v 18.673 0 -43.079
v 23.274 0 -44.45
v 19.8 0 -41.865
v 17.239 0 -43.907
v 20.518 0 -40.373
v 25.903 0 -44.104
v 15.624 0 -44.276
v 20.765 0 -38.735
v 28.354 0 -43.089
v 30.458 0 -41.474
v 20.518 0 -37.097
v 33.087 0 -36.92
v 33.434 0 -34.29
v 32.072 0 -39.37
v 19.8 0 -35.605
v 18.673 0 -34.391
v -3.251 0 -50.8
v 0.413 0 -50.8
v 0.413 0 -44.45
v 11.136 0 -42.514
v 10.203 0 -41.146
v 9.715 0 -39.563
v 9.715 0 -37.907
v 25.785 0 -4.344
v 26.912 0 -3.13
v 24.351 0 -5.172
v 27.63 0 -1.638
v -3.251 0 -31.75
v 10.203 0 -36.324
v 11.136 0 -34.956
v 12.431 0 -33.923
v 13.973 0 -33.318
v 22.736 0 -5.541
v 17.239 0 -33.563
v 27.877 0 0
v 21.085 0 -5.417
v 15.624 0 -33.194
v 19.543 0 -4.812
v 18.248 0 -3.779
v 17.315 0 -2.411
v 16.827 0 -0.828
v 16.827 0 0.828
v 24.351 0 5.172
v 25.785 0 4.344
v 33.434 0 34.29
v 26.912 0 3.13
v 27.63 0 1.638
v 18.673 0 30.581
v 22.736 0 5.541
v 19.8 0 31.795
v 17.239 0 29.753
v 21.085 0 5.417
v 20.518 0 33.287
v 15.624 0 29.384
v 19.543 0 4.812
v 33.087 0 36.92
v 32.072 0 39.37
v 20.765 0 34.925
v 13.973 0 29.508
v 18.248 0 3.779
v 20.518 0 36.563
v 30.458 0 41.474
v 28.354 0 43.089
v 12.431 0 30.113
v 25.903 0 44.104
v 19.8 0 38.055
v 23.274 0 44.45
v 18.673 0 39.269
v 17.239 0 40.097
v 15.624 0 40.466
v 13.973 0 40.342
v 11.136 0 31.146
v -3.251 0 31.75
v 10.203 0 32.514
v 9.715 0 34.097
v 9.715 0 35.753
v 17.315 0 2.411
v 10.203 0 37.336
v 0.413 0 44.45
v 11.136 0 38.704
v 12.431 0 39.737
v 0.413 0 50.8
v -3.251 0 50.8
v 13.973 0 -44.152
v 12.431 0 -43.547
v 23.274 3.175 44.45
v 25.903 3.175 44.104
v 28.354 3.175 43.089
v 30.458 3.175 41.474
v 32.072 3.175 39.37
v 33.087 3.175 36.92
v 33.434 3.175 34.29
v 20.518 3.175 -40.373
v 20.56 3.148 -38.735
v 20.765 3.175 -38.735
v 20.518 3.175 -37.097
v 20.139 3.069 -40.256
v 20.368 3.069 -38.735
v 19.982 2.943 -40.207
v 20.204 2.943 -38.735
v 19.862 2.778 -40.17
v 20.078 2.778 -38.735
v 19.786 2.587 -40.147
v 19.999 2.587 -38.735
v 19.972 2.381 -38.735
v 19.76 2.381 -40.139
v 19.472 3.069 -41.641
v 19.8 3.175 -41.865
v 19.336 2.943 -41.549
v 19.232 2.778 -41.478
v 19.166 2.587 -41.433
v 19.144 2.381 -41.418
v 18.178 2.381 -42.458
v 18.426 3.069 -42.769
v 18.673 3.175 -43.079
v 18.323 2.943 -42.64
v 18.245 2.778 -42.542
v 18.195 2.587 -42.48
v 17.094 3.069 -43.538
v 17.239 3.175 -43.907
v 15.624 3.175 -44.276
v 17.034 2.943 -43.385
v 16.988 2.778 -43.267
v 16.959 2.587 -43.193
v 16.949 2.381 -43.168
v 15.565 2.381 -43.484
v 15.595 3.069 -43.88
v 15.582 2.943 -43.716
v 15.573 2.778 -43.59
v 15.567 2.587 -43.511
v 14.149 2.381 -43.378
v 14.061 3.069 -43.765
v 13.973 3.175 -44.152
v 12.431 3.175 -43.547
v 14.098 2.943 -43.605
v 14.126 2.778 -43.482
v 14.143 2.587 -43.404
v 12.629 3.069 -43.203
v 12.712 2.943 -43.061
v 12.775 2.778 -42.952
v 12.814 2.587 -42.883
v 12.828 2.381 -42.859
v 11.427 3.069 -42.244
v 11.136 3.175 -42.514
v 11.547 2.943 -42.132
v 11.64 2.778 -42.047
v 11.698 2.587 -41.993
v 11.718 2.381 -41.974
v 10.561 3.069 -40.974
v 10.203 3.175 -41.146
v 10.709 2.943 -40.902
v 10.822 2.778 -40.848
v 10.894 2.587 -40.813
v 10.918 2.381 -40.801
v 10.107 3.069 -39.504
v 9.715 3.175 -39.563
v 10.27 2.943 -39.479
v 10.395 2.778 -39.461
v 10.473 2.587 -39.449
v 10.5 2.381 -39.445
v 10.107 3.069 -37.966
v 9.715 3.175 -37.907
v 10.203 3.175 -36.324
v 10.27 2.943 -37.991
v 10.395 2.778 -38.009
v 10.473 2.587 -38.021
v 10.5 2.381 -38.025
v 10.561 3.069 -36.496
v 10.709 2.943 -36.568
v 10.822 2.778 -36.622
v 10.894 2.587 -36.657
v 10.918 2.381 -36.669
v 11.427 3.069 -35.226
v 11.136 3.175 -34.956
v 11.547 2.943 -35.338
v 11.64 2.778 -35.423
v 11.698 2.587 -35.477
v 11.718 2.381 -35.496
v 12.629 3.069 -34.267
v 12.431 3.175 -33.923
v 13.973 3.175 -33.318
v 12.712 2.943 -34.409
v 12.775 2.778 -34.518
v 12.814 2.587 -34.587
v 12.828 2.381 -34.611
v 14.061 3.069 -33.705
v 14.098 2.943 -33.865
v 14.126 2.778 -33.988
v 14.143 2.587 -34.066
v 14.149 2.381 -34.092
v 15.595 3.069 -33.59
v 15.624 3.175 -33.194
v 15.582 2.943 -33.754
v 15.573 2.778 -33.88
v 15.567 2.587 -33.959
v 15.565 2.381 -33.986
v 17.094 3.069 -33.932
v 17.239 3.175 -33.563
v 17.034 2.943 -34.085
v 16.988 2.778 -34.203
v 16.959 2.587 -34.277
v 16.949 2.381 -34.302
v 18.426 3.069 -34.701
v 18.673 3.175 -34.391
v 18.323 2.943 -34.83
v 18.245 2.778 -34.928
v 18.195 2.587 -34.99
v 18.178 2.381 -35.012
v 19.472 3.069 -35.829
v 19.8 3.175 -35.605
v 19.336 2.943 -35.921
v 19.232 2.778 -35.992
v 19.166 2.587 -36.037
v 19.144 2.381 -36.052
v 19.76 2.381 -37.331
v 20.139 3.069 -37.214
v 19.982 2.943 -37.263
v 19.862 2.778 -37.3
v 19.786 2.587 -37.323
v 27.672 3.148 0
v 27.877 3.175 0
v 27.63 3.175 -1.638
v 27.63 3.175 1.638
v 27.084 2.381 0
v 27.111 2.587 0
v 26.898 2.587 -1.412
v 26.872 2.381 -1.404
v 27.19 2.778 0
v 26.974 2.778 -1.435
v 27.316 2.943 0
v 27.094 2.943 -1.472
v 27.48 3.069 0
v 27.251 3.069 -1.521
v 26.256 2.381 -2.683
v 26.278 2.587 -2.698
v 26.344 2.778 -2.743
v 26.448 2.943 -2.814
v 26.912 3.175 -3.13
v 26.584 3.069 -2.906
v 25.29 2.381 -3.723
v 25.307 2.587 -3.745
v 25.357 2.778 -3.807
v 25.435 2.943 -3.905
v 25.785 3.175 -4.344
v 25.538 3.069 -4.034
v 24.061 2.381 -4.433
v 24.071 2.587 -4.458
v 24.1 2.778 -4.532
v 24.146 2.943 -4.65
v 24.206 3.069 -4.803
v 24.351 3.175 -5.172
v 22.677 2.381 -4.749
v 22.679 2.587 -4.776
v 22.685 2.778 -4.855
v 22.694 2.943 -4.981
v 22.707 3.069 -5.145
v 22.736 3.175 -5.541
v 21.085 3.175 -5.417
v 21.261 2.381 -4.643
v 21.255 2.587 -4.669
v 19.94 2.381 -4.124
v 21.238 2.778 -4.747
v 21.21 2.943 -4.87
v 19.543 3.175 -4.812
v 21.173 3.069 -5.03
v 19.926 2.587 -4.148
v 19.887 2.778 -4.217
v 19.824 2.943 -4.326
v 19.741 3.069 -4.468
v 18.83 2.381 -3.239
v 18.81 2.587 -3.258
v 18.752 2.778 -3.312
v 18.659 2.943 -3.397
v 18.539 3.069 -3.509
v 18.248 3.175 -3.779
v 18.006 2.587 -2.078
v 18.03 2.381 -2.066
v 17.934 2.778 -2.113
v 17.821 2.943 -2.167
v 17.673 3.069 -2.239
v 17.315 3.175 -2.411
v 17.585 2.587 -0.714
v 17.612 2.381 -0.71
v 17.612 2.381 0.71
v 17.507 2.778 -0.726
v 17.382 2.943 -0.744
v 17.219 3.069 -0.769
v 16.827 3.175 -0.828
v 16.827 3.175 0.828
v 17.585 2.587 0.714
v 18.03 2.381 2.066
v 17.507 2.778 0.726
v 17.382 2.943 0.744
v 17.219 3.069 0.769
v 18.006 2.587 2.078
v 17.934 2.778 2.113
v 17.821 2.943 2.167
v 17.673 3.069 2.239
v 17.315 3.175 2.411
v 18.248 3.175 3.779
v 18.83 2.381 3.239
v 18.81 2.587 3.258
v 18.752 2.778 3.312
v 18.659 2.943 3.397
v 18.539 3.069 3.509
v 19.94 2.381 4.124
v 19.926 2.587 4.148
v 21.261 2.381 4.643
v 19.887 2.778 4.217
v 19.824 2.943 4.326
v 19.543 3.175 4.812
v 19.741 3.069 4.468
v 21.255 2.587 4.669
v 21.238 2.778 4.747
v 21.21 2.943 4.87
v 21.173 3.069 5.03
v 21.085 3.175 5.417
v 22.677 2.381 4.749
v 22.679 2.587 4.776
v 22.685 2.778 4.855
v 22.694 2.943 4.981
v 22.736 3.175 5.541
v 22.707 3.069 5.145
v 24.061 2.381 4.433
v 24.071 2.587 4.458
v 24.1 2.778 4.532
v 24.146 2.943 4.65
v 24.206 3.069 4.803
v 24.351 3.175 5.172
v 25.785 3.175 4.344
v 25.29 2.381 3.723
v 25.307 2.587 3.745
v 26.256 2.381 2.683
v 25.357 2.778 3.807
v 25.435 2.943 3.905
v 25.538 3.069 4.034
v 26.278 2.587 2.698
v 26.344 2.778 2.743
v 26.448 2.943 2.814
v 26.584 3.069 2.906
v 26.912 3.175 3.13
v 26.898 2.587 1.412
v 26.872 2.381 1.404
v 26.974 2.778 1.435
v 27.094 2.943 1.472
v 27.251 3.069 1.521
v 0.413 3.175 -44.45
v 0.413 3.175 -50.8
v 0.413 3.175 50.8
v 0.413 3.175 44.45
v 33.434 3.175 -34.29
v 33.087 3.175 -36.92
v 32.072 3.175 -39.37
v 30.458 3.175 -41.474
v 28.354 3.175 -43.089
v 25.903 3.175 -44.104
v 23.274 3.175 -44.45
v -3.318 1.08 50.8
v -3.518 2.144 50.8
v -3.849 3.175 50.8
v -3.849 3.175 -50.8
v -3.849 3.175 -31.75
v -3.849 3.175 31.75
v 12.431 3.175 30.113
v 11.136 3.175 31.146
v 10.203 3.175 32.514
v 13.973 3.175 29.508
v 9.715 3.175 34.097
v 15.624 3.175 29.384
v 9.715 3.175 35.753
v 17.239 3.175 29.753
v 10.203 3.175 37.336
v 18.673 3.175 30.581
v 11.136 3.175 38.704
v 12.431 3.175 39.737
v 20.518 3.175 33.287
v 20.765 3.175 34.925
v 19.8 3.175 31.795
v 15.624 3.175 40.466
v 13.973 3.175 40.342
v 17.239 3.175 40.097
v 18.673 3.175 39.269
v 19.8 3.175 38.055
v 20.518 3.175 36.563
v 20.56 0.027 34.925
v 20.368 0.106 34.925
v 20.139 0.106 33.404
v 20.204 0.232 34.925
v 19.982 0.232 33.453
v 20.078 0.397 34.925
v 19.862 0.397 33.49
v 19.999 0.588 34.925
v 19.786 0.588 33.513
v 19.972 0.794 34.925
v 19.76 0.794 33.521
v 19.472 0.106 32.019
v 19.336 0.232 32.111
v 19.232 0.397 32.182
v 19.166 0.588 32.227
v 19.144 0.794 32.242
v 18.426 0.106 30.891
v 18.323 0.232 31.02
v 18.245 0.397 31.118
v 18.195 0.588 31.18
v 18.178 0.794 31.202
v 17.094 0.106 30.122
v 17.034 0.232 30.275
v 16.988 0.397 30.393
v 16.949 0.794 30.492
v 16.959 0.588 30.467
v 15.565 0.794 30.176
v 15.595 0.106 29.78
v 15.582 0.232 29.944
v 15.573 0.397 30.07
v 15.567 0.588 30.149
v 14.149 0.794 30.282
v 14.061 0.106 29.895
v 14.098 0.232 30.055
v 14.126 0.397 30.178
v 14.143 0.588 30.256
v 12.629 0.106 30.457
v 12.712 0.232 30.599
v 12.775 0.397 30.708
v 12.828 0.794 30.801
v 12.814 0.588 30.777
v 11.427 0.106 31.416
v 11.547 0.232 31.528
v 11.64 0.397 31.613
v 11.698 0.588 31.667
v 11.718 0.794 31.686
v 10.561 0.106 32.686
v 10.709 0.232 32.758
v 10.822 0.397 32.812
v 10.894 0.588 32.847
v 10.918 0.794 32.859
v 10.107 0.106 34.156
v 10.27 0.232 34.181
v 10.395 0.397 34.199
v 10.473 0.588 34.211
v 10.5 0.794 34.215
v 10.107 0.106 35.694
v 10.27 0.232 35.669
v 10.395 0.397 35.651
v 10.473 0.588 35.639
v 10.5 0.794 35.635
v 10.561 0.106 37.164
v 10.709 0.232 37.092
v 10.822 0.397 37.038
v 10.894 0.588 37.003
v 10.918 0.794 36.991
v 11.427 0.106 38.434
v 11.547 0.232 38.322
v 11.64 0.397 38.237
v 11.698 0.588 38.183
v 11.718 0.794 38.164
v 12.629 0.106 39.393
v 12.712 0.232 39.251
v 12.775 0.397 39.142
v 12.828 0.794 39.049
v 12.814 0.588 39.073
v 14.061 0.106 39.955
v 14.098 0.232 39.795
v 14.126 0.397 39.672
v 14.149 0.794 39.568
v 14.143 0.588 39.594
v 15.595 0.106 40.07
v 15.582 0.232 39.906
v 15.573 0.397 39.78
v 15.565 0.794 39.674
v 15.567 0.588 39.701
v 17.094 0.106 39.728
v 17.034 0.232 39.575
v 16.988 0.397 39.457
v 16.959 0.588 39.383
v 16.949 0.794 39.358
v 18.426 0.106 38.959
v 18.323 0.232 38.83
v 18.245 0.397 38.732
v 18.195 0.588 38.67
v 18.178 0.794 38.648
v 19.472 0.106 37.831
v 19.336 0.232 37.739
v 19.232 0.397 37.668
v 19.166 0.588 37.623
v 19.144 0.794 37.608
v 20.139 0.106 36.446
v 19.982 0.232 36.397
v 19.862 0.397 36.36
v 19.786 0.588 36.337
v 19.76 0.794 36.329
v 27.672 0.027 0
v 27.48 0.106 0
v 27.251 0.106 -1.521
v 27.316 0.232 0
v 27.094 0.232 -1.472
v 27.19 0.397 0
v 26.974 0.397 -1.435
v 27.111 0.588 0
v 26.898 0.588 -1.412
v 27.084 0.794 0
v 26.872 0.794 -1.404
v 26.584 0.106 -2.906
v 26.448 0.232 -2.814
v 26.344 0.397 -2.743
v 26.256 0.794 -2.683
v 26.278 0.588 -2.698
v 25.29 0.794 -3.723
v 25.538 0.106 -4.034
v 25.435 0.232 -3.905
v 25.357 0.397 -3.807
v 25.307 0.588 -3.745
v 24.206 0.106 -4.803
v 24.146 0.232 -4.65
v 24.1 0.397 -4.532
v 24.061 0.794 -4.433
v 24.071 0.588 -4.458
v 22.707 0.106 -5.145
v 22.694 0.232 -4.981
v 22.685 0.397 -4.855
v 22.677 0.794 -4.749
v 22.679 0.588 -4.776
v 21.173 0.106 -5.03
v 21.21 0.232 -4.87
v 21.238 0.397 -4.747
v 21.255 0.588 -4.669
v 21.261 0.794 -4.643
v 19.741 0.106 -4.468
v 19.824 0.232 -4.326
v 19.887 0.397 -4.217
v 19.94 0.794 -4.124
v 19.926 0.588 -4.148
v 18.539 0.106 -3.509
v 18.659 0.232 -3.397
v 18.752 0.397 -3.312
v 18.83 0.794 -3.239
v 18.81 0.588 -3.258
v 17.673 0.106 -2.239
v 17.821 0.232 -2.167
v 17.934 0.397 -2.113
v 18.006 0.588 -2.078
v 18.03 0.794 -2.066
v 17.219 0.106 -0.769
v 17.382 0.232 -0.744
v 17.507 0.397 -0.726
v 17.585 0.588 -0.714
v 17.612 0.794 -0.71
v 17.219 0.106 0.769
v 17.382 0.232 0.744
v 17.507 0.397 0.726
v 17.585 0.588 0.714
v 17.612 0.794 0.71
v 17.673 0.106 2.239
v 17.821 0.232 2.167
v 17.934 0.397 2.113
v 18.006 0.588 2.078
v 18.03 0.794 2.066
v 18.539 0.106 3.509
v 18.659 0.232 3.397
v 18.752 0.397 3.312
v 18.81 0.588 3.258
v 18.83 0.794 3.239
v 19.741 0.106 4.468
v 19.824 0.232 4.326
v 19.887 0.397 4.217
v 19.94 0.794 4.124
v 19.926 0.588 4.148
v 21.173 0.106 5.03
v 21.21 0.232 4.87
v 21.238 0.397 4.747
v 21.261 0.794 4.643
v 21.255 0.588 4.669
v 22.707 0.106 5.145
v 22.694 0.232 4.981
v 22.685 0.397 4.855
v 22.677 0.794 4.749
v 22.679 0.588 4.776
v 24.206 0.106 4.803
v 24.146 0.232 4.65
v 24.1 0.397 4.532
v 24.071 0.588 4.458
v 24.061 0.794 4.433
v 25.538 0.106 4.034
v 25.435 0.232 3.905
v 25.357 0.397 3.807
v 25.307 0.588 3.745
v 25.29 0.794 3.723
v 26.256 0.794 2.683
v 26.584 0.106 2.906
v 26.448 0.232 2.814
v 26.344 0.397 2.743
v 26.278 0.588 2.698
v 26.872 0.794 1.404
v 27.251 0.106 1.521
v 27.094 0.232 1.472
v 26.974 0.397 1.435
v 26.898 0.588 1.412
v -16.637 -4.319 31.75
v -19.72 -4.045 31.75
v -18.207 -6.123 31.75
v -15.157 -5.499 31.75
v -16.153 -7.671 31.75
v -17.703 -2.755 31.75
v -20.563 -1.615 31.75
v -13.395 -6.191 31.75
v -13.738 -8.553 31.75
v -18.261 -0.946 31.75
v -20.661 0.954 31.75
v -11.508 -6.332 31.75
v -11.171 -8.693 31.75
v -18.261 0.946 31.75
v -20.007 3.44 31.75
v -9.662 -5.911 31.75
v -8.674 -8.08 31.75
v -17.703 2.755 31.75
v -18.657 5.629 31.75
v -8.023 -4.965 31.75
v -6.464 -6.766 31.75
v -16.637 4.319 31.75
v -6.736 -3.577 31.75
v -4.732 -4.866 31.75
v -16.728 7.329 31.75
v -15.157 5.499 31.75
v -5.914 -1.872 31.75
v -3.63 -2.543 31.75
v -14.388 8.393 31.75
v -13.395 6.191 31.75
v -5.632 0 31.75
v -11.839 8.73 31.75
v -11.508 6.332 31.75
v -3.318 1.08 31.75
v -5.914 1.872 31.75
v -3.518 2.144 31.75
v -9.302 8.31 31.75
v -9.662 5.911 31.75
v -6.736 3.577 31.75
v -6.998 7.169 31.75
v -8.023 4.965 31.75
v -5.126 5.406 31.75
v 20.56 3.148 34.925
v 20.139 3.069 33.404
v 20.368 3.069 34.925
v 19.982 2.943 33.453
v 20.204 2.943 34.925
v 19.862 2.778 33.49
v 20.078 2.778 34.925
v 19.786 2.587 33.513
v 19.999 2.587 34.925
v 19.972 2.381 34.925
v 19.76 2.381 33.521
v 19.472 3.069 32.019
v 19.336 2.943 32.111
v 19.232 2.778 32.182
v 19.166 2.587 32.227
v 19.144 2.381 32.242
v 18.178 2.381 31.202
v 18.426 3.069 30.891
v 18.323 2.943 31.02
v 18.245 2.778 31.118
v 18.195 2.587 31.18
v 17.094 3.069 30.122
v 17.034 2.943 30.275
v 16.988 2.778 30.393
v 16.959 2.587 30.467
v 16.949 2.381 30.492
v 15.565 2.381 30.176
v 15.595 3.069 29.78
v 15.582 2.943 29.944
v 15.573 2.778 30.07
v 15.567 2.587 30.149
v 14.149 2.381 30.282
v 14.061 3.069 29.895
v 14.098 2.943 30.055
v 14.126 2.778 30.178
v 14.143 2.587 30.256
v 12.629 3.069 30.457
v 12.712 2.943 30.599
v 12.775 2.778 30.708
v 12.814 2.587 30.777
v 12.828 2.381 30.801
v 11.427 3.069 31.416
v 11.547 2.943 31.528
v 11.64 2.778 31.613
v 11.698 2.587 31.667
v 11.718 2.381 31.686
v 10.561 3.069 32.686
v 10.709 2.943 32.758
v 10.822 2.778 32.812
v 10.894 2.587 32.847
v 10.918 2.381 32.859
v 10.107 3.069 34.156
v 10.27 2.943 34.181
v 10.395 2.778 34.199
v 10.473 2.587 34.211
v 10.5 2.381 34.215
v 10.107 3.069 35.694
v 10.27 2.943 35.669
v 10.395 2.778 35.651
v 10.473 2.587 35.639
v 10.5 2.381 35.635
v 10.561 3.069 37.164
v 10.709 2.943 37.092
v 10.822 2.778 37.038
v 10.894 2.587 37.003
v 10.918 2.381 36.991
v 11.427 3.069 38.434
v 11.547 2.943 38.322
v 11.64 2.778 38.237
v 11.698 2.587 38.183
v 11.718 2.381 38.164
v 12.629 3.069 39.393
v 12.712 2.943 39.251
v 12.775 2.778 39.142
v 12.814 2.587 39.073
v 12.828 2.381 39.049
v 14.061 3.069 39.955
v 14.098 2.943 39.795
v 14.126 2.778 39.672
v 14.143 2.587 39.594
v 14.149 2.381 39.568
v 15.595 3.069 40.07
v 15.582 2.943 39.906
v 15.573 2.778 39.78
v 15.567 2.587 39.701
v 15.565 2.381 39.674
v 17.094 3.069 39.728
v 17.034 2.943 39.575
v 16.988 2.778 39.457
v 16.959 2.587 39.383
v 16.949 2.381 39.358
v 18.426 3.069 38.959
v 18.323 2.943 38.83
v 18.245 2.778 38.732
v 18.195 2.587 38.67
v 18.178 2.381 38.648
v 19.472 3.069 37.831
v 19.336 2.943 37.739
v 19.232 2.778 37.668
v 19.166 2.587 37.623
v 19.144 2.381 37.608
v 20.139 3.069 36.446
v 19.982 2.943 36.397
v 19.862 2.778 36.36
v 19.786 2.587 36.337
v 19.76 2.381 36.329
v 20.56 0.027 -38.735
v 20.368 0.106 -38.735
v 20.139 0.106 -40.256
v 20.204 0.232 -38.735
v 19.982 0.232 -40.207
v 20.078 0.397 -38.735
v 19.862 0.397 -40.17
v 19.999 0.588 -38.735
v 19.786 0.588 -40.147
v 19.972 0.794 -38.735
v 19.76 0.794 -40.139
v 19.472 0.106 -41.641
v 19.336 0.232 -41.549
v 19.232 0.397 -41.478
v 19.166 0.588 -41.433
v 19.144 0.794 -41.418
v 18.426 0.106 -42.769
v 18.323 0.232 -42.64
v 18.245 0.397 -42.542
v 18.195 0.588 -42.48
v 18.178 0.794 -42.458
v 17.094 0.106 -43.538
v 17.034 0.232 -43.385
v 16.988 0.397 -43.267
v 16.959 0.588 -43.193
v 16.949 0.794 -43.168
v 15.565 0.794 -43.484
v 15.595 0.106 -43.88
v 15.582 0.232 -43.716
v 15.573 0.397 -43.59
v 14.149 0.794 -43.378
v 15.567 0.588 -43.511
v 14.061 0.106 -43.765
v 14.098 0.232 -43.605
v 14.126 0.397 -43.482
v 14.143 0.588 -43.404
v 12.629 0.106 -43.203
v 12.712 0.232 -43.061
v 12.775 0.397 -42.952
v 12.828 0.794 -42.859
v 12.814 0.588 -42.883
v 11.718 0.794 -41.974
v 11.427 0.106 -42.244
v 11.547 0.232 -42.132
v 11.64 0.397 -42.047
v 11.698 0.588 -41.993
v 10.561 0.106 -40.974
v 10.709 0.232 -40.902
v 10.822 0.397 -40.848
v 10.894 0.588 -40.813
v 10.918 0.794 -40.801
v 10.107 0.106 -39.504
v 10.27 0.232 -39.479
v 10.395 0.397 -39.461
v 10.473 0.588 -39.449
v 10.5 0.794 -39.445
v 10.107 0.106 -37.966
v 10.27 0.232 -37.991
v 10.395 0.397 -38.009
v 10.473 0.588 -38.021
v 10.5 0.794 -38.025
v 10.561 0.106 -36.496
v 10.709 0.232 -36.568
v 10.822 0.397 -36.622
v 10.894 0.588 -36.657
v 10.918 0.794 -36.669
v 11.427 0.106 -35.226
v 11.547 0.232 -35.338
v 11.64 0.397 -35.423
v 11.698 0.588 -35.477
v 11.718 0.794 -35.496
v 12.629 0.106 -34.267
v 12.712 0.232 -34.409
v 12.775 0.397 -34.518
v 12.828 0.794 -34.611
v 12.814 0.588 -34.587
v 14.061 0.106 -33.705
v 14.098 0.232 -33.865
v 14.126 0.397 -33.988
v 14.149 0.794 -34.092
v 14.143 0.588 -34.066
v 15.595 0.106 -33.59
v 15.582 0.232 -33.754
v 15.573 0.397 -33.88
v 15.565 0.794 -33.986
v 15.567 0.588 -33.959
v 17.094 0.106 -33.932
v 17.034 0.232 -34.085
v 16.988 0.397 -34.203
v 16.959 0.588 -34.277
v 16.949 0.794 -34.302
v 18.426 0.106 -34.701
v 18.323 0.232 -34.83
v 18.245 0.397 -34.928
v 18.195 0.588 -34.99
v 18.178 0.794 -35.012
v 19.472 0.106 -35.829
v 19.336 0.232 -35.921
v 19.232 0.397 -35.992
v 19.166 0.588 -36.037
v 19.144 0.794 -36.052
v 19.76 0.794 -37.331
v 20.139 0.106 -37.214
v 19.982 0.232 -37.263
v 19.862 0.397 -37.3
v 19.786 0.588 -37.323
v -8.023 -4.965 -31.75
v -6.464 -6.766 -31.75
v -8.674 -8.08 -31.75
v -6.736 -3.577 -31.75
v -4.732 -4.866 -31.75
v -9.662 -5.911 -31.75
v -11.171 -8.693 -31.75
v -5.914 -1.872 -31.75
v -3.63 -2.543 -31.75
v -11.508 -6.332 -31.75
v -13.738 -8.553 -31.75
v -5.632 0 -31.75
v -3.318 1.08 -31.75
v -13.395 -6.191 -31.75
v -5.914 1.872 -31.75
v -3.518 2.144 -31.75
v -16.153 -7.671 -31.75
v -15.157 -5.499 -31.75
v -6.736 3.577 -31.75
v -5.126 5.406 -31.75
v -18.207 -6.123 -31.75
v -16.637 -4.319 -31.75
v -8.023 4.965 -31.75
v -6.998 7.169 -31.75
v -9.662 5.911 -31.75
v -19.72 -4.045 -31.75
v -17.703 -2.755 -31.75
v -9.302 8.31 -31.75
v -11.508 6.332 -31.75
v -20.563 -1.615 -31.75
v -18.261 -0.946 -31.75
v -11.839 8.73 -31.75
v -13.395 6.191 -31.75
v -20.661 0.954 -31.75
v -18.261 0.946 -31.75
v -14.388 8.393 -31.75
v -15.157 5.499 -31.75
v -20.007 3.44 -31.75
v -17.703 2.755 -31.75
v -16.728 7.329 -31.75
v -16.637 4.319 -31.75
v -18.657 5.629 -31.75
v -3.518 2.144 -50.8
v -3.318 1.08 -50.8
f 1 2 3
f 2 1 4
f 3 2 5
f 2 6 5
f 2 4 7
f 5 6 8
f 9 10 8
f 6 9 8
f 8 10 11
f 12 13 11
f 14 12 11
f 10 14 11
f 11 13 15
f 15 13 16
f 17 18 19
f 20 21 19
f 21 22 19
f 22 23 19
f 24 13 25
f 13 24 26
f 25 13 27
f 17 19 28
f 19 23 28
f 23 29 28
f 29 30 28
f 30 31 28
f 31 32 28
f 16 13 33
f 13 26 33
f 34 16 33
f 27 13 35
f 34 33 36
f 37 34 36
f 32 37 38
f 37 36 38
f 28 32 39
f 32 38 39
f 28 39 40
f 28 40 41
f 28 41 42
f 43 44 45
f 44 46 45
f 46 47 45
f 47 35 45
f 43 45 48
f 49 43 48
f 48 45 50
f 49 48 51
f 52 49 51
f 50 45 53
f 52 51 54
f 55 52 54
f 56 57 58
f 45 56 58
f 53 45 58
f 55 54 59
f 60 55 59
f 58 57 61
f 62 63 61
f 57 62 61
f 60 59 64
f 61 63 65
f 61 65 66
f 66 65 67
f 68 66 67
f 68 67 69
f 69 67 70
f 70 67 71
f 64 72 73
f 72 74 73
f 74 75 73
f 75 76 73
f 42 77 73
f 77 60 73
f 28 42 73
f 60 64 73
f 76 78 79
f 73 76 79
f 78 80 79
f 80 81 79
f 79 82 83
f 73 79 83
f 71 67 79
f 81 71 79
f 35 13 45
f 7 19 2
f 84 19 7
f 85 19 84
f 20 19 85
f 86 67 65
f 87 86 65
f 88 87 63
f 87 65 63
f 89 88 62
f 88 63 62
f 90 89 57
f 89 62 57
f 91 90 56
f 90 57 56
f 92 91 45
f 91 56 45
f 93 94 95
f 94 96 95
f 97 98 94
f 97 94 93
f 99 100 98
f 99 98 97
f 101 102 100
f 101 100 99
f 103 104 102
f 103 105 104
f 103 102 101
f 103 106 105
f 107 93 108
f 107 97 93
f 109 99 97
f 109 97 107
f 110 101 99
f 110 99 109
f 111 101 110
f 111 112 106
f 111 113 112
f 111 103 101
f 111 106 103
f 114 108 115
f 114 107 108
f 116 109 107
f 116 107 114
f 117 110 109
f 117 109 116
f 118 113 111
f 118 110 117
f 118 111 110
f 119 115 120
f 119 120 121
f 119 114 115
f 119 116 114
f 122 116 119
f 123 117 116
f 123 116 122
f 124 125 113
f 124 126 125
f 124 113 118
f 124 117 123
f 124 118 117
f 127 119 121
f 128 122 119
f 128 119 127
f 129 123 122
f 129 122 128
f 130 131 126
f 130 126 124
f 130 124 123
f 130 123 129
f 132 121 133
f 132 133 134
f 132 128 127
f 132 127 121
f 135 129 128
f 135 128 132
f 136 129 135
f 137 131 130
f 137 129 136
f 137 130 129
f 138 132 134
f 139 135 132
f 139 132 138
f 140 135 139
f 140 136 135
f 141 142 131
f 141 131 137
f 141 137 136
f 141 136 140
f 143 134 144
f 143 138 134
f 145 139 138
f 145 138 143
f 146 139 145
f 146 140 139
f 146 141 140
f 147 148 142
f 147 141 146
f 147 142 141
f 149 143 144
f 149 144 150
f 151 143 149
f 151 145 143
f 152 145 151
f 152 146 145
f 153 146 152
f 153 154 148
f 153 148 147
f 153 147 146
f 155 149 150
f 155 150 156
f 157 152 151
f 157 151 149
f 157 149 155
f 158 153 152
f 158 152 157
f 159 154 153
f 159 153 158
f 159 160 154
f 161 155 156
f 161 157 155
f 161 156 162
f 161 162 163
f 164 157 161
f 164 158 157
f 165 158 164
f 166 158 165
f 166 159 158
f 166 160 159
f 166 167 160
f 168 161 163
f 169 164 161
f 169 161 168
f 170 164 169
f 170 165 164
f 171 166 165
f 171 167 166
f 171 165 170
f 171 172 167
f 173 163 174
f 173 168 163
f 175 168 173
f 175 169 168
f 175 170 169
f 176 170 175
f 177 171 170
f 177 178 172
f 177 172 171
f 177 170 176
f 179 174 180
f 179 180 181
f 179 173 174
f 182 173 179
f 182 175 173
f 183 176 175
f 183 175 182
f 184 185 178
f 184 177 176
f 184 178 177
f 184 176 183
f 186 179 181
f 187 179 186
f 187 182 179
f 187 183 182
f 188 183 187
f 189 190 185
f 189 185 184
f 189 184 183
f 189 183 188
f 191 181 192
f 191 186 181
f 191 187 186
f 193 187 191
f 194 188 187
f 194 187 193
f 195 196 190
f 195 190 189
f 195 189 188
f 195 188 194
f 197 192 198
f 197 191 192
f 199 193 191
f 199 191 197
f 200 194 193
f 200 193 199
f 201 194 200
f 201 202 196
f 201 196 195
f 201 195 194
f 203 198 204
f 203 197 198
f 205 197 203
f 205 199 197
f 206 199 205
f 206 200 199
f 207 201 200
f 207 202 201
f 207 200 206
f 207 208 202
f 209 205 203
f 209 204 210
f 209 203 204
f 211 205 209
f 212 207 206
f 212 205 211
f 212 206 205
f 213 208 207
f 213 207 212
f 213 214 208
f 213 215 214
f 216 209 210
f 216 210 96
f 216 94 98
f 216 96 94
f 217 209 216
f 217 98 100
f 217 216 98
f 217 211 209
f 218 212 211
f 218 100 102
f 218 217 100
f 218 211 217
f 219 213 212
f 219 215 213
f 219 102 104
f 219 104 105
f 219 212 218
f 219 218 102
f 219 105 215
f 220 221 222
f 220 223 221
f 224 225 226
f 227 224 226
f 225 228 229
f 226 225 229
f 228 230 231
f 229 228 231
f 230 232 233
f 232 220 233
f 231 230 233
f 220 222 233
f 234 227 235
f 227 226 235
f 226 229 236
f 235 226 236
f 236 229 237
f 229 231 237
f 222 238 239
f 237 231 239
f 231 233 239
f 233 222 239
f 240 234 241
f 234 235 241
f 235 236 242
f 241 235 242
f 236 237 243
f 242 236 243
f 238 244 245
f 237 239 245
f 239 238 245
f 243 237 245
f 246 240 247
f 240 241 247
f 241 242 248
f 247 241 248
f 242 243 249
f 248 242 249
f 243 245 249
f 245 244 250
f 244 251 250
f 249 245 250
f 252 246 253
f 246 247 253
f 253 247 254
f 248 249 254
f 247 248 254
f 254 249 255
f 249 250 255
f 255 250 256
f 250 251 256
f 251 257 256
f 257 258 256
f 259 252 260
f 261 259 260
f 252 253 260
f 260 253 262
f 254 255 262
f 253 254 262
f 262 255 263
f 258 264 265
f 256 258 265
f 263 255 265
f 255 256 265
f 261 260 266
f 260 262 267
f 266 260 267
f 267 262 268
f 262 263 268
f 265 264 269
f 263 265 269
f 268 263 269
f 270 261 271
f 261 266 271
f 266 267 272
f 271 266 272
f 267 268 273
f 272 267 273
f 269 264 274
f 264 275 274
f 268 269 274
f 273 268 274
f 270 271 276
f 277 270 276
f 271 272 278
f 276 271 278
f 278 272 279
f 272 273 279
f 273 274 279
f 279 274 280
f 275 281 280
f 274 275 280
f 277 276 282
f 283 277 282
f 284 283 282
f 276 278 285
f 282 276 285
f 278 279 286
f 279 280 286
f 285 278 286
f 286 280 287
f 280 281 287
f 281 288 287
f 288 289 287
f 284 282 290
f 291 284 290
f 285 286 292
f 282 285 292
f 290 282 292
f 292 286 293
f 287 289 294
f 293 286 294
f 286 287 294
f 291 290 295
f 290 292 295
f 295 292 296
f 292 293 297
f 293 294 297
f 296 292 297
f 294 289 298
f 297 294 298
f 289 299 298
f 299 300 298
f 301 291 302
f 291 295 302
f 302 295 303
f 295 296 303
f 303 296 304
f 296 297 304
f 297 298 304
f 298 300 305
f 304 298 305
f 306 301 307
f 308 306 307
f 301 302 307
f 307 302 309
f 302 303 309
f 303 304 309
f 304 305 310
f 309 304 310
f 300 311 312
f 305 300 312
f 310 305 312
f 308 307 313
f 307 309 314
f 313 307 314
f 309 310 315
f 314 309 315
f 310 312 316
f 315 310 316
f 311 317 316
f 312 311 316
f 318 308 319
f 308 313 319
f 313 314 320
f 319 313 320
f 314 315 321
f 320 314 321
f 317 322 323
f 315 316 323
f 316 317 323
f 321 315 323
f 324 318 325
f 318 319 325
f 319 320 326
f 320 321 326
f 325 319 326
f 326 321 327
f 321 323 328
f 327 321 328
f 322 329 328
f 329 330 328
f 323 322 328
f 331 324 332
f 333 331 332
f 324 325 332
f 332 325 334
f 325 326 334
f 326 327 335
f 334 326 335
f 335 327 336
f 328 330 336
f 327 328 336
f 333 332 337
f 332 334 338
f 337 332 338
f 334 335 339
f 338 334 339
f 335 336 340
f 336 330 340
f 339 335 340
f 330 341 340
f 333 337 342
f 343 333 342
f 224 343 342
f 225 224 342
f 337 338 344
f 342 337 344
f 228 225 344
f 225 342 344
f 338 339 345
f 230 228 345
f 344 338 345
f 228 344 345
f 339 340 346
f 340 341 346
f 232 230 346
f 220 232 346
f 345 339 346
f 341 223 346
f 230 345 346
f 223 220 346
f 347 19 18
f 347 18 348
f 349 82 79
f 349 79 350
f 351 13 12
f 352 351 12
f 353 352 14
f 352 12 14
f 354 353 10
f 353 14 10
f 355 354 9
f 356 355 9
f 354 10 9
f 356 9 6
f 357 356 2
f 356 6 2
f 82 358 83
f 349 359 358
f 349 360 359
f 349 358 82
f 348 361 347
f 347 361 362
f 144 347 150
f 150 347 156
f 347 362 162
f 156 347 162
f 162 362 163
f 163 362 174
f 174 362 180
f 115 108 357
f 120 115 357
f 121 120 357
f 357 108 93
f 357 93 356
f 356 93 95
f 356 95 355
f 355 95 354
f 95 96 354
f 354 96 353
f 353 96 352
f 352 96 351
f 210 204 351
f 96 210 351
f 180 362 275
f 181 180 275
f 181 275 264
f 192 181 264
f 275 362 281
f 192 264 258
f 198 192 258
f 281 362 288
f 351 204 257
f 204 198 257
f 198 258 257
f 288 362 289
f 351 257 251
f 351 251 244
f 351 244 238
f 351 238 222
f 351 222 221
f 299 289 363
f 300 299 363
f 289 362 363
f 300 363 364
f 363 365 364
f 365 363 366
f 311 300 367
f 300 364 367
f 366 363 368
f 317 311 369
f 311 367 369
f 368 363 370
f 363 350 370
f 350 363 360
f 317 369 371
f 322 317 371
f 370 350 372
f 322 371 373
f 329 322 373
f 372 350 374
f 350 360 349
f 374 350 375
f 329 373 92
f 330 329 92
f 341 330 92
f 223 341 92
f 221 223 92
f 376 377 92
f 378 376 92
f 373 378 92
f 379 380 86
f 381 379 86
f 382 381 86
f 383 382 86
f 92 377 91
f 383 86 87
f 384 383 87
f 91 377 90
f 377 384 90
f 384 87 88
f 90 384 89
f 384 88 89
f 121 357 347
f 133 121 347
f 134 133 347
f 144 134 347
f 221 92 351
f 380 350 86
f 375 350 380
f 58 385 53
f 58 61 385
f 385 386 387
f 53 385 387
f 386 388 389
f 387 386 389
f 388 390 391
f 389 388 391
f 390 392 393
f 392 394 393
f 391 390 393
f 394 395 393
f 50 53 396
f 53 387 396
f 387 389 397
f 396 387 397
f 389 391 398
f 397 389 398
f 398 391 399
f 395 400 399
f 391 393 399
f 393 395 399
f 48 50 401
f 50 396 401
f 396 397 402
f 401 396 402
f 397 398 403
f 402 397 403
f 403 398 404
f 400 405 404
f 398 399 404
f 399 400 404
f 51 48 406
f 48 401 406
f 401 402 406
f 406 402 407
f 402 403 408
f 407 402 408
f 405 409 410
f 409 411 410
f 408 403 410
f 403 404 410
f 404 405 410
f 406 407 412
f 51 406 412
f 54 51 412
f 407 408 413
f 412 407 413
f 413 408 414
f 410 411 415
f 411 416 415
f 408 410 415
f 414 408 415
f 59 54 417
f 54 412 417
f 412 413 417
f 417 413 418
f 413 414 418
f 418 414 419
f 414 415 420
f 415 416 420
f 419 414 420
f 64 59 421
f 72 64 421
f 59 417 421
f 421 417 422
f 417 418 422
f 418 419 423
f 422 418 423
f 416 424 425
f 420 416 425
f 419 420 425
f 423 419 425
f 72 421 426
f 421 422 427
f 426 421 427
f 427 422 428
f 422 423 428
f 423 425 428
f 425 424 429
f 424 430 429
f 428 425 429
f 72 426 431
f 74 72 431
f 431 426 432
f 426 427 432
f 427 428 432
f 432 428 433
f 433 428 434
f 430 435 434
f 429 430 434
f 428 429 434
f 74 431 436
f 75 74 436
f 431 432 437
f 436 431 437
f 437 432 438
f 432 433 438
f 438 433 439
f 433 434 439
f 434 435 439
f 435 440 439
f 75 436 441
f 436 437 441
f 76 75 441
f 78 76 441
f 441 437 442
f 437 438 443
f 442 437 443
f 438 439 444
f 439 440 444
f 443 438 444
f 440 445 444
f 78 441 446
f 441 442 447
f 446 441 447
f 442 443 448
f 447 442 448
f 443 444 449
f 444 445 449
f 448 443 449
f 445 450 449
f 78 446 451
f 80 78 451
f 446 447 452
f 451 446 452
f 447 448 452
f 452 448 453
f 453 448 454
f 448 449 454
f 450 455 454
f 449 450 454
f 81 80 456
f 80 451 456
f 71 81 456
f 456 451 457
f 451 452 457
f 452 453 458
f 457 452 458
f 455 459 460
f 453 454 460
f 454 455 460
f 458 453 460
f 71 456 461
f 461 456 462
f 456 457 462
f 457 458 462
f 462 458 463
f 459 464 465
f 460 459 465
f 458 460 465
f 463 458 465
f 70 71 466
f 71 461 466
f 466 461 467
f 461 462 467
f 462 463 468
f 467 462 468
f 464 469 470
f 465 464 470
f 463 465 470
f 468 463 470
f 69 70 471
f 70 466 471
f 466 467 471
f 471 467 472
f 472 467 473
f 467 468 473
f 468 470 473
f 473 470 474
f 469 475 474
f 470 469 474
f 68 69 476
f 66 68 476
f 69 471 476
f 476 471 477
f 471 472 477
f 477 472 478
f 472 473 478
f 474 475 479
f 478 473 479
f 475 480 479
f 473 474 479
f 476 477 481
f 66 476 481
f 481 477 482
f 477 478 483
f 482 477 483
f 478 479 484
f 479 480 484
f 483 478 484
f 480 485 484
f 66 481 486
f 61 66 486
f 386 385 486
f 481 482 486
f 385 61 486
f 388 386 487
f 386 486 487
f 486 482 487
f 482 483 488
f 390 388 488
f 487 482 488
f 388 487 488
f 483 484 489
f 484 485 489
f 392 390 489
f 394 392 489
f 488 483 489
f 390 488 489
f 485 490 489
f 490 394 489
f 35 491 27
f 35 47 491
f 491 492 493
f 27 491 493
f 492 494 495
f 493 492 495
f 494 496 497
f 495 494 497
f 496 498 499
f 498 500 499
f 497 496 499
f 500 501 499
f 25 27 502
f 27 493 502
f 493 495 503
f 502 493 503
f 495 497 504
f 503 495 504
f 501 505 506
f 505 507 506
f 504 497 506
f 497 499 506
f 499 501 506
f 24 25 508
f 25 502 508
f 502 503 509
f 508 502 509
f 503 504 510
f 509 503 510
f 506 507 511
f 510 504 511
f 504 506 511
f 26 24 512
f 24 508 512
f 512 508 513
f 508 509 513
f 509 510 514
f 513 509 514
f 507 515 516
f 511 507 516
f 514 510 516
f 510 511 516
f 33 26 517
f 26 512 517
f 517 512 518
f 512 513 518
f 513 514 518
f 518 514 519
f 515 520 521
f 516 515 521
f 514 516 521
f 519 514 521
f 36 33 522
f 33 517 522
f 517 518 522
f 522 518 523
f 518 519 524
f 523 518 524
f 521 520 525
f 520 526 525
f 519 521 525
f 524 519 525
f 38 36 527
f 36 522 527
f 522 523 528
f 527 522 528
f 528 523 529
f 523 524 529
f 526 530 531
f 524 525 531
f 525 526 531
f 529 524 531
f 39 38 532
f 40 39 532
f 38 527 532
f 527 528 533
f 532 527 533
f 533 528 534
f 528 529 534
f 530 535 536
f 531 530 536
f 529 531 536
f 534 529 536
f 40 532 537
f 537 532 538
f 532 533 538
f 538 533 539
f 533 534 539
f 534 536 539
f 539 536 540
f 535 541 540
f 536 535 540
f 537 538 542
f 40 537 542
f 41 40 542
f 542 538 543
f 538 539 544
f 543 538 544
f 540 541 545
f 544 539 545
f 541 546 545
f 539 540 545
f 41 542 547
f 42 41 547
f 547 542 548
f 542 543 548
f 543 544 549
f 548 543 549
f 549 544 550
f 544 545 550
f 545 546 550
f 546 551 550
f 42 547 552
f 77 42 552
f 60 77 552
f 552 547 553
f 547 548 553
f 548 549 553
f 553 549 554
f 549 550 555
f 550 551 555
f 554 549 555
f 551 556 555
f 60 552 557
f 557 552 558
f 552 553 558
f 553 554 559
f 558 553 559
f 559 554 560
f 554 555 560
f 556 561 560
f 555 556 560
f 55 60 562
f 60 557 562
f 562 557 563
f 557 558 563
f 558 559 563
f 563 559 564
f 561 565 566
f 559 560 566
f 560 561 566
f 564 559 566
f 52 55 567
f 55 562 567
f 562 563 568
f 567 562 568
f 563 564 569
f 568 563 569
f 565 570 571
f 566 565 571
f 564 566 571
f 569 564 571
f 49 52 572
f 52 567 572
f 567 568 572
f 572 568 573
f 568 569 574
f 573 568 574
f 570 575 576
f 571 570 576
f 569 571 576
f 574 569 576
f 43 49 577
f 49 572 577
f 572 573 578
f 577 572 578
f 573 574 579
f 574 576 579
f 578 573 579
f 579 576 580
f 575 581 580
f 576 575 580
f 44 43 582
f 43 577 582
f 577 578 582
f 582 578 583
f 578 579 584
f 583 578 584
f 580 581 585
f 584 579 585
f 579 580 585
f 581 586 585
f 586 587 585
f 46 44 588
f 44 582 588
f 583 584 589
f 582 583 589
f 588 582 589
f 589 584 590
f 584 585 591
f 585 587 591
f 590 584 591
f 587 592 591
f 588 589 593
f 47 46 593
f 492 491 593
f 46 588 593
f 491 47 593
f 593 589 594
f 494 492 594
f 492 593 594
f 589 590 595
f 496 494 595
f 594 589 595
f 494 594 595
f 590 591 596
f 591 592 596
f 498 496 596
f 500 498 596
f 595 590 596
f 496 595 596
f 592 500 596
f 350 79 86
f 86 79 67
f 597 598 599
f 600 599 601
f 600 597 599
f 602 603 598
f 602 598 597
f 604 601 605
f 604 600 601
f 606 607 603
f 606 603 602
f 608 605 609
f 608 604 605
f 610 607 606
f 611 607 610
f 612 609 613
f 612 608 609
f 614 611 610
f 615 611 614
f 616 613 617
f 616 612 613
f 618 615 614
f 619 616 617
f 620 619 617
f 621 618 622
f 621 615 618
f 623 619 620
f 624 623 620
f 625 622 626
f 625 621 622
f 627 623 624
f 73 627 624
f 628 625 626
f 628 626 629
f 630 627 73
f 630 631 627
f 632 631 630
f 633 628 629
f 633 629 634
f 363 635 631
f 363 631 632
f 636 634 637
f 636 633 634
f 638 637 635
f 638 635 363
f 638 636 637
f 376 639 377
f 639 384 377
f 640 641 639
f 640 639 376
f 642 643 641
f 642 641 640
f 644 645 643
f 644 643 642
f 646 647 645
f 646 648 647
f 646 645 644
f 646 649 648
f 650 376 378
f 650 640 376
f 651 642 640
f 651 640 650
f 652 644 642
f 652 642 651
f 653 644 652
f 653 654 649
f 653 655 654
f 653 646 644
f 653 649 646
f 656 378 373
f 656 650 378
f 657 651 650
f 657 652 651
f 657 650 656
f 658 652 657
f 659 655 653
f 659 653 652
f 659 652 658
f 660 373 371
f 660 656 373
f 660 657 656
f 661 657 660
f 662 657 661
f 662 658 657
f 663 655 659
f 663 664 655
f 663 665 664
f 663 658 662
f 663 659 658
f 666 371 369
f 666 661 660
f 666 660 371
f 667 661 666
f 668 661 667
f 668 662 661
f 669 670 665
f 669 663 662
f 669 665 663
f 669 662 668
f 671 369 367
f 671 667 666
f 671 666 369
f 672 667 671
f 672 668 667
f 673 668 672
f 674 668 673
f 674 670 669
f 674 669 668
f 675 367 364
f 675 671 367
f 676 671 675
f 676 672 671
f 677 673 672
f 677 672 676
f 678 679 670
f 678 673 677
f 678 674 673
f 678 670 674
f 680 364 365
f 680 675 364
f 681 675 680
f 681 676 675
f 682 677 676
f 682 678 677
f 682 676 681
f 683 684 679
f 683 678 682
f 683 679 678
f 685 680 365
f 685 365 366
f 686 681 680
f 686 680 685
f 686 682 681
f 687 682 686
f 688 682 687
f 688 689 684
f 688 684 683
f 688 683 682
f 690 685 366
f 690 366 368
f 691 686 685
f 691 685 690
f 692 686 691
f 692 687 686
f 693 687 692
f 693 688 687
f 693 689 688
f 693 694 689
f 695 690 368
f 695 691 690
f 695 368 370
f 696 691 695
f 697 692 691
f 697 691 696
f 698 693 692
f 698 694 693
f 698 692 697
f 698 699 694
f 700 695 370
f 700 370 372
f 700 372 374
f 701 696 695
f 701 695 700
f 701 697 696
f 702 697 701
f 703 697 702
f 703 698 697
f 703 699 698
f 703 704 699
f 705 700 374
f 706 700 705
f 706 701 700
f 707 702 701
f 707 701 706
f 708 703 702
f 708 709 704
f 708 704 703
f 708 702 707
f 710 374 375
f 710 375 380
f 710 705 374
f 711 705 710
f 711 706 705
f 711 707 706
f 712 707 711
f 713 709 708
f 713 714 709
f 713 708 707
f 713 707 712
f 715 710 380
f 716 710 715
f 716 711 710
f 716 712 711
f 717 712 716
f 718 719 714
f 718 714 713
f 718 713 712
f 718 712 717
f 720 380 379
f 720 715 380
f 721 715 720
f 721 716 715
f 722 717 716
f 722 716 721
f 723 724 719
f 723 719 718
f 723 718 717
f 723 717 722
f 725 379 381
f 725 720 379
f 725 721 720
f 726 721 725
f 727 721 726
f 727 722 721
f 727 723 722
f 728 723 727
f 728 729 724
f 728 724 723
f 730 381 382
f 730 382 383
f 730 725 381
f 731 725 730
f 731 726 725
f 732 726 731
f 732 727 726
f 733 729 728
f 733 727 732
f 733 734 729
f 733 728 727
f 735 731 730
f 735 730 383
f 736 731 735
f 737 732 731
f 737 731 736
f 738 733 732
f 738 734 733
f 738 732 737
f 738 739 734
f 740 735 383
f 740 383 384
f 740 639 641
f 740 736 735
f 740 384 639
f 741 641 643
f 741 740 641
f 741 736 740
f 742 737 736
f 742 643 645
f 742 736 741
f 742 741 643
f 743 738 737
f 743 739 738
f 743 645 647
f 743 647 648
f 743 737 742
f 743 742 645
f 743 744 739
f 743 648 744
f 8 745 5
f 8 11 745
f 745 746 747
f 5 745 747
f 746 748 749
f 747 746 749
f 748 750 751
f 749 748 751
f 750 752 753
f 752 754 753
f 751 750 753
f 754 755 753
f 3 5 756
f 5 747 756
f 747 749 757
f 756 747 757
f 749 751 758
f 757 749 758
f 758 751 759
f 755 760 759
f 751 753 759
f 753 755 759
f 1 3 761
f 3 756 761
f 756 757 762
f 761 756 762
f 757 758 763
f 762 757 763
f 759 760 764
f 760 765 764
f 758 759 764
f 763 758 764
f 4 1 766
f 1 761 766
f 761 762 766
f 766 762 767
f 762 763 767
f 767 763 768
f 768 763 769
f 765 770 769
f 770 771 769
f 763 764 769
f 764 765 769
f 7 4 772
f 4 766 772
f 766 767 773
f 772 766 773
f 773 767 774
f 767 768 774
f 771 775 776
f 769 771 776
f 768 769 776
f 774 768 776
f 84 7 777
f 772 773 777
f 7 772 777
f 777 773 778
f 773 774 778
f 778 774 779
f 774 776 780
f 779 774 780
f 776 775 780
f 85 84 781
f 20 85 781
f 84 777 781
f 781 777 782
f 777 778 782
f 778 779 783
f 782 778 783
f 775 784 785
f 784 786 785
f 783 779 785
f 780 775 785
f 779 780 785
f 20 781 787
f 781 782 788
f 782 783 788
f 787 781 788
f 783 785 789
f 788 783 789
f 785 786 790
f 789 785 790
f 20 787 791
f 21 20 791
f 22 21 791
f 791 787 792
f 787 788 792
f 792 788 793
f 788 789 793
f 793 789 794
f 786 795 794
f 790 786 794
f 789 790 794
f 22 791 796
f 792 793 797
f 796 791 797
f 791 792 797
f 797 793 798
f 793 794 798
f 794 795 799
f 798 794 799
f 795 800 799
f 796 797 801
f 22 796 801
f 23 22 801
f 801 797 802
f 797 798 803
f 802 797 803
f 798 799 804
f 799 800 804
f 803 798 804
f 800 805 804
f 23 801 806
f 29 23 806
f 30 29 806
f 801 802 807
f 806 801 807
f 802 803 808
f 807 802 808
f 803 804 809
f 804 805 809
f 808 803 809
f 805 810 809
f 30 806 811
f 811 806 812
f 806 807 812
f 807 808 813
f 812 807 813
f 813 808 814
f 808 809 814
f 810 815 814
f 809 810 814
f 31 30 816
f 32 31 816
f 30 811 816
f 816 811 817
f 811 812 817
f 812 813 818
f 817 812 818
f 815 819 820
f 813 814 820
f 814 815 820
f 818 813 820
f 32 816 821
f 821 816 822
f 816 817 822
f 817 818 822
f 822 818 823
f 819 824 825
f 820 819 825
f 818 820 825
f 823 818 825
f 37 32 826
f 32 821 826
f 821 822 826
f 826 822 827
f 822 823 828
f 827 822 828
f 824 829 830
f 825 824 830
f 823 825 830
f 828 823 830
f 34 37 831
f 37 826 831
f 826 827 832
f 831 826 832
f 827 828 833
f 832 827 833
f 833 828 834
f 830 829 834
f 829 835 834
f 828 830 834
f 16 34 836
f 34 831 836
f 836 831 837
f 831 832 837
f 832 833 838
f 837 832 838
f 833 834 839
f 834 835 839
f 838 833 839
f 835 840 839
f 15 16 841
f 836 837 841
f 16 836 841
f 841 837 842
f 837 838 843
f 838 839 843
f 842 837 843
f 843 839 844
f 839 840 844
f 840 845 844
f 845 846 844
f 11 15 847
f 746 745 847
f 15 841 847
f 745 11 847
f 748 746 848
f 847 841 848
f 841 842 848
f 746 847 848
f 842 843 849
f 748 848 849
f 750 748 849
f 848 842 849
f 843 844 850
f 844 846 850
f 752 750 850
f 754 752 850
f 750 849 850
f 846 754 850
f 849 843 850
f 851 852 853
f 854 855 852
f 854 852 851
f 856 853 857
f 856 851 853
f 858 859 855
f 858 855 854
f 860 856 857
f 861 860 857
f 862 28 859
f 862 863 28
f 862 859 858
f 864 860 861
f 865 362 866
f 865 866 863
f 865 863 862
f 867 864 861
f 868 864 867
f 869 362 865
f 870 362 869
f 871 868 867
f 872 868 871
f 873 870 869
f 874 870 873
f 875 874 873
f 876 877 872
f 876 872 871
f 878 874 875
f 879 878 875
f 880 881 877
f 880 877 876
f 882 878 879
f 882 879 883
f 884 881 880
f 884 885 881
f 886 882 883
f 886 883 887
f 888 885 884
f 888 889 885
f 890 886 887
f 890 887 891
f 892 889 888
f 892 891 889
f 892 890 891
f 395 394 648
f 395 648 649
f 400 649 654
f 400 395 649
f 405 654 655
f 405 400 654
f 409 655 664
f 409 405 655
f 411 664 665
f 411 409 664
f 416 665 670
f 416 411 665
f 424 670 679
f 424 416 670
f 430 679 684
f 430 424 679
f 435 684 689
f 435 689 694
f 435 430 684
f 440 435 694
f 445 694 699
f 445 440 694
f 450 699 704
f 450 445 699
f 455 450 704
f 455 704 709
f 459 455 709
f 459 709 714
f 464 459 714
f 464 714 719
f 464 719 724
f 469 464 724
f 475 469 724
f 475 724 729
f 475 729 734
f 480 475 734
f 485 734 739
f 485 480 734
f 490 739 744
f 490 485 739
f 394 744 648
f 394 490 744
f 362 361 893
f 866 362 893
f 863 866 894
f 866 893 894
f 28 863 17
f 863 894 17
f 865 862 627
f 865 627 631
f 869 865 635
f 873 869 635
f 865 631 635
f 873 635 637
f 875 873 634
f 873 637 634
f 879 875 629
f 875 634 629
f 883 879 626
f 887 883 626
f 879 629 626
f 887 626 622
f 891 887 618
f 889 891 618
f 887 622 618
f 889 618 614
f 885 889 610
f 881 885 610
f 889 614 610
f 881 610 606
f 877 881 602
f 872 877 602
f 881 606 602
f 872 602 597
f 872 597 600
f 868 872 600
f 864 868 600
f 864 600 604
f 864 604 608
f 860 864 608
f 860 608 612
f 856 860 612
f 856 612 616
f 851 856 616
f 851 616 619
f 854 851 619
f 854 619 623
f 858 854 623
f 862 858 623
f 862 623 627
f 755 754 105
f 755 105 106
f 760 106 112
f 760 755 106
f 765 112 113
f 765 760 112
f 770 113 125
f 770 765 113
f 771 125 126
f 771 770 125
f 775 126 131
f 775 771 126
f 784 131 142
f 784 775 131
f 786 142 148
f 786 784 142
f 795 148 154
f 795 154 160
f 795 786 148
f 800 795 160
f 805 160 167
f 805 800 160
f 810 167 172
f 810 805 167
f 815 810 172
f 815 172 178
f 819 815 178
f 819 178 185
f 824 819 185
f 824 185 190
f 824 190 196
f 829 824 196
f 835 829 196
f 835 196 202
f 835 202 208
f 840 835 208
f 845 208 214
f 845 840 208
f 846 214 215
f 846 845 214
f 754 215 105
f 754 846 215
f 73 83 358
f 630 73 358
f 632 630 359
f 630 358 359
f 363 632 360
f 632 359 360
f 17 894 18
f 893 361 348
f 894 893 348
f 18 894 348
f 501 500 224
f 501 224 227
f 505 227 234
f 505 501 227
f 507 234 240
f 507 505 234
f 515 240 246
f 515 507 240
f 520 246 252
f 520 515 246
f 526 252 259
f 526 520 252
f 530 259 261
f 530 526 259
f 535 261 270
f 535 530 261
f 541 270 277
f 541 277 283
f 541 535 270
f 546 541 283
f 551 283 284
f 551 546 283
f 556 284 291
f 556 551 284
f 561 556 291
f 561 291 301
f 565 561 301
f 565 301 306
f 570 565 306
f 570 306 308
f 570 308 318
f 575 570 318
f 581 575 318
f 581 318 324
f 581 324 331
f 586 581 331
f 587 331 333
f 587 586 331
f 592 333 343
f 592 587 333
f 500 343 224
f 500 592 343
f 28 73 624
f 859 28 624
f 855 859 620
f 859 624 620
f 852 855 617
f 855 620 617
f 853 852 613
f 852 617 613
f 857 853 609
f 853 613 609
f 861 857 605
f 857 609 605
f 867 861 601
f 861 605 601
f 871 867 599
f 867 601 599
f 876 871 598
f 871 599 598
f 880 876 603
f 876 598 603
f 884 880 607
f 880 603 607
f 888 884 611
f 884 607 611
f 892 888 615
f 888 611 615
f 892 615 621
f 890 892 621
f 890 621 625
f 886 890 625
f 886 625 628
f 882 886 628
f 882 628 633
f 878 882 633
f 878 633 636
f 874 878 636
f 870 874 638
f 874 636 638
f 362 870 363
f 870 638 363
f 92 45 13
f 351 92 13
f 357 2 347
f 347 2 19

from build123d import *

# Parameters (mm, degrees)
SKETCH1_R                = 4.7625
BOSS_EXTRUDE1_DEPTH      = 3.175
SKETCH2_R                = 6.35
BOSS_EXTRUDE2_DEPTH      = 6.35
BOSS_EXTRUDE2_DEPTH_BACK = 95.25
SKETCH4_R                = 8.73125
CUT_EXTRUDE3_DEPTH       = 19.05
SKETCH5_R                = 8.73125
CUT_EXTRUDE4_DEPTH       = 19.05
FILLET1_R                = 0.79375
SKETCH6_W                = 0.4134866
SKETCH6_H                = 3.175
BOSS_EXTRUDE3_DEPTH      = 101.6


with BuildPart() as part:
    # Sketch1 → Boss-Extrude1 (new body)
    with BuildSketch(Plane(origin=(0, 0, 0), x_dir=(1, 0, 0), z_dir=(0, 1, 0))):
        with BuildLine():
            Line((0, 44.45), (0, -44.45))
            Line((0, -44.45), (23.273512, -44.45))
            ThreePointArc((23.273512, -44.45), (30.457716897, -41.474204897), (33.433512, -34.29))
            Line((33.433512, -34.29), (33.433512, 34.29))
            ThreePointArc((33.433512, 34.29), (30.457716897, 41.474204897), (23.273512, 44.45))
            Line((23.273512, 44.45), (0, 44.45))
        make_face()
        with Locations((15.209012, 38.735)):
            Circle(SKETCH1_R, mode=Mode.SUBTRACT)
        with Locations((15.209012, -34.925)):
            Circle(SKETCH1_R, mode=Mode.SUBTRACT)
        with Locations((22.321012, 0)):
            Circle(SKETCH1_R, mode=Mode.SUBTRACT)
    extrude(amount=BOSS_EXTRUDE1_DEPTH)

    # Sketch2 → Boss-Extrude2 (add, two sides)
    with BuildSketch(Plane.XY.offset(44.45)) as boss_extrude2_sk:
        with BuildLine():
            Line((0, 0), (-3.250954467, 0))
            ThreePointArc((-3.250954467, 0), (-20.562720138, -1.615387688), (-3.848687297, 3.175))
            Line((-3.848687297, 3.175), (0, 3.175))
            Line((0, 3.175), (0, 0))
        make_face()
        with Locations((-11.982204467, 0)):
            Circle(SKETCH2_R, mode=Mode.SUBTRACT)
    extrude(amount=BOSS_EXTRUDE2_DEPTH)
    extrude(boss_extrude2_sk.sketch, amount=-BOSS_EXTRUDE2_DEPTH_BACK)

    # Sketch4 → Cut-Extrude3 (cut)
    with BuildSketch(Plane.XY.offset(50.8)):
        with Locations((-11.982204467, 0)):
            Circle(SKETCH4_R)
    extrude(amount=-CUT_EXTRUDE3_DEPTH, mode=Mode.SUBTRACT)

    # Sketch5 → Cut-Extrude4 (cut)
    with BuildSketch(Plane(origin=(0, 0, -50.8), x_dir=(-1, 0, 0), z_dir=(0, 0, -1))):
        with Locations((11.982204467, 0)):
            Circle(SKETCH5_R)
    extrude(amount=-CUT_EXTRUDE4_DEPTH, mode=Mode.SUBTRACT)

    # Fillet1
    fillet1_edges = [part.edges().sort_by_distance(p)[0] for p in [
        (10.446512, 0, -38.735),
        (10.446512, 3.175, -38.735),
        (10.446512, 0, 34.925),
        (10.446512, 3.175, 34.925),
        (17.558512, 0, 0),
        (17.558512, 3.175, 0),
    ]]
    fillet(fillet1_edges, radius=FILLET1_R)

    # Sketch6 → Boss-Extrude3 (add)
    with BuildSketch(Plane.XY.offset(50.8)):
        with Locations((0.2067433, 1.5875)):
            Rectangle(SKETCH6_W, SKETCH6_H)
    extrude(amount=-BOSS_EXTRUDE3_DEPTH)


solid = part.part
